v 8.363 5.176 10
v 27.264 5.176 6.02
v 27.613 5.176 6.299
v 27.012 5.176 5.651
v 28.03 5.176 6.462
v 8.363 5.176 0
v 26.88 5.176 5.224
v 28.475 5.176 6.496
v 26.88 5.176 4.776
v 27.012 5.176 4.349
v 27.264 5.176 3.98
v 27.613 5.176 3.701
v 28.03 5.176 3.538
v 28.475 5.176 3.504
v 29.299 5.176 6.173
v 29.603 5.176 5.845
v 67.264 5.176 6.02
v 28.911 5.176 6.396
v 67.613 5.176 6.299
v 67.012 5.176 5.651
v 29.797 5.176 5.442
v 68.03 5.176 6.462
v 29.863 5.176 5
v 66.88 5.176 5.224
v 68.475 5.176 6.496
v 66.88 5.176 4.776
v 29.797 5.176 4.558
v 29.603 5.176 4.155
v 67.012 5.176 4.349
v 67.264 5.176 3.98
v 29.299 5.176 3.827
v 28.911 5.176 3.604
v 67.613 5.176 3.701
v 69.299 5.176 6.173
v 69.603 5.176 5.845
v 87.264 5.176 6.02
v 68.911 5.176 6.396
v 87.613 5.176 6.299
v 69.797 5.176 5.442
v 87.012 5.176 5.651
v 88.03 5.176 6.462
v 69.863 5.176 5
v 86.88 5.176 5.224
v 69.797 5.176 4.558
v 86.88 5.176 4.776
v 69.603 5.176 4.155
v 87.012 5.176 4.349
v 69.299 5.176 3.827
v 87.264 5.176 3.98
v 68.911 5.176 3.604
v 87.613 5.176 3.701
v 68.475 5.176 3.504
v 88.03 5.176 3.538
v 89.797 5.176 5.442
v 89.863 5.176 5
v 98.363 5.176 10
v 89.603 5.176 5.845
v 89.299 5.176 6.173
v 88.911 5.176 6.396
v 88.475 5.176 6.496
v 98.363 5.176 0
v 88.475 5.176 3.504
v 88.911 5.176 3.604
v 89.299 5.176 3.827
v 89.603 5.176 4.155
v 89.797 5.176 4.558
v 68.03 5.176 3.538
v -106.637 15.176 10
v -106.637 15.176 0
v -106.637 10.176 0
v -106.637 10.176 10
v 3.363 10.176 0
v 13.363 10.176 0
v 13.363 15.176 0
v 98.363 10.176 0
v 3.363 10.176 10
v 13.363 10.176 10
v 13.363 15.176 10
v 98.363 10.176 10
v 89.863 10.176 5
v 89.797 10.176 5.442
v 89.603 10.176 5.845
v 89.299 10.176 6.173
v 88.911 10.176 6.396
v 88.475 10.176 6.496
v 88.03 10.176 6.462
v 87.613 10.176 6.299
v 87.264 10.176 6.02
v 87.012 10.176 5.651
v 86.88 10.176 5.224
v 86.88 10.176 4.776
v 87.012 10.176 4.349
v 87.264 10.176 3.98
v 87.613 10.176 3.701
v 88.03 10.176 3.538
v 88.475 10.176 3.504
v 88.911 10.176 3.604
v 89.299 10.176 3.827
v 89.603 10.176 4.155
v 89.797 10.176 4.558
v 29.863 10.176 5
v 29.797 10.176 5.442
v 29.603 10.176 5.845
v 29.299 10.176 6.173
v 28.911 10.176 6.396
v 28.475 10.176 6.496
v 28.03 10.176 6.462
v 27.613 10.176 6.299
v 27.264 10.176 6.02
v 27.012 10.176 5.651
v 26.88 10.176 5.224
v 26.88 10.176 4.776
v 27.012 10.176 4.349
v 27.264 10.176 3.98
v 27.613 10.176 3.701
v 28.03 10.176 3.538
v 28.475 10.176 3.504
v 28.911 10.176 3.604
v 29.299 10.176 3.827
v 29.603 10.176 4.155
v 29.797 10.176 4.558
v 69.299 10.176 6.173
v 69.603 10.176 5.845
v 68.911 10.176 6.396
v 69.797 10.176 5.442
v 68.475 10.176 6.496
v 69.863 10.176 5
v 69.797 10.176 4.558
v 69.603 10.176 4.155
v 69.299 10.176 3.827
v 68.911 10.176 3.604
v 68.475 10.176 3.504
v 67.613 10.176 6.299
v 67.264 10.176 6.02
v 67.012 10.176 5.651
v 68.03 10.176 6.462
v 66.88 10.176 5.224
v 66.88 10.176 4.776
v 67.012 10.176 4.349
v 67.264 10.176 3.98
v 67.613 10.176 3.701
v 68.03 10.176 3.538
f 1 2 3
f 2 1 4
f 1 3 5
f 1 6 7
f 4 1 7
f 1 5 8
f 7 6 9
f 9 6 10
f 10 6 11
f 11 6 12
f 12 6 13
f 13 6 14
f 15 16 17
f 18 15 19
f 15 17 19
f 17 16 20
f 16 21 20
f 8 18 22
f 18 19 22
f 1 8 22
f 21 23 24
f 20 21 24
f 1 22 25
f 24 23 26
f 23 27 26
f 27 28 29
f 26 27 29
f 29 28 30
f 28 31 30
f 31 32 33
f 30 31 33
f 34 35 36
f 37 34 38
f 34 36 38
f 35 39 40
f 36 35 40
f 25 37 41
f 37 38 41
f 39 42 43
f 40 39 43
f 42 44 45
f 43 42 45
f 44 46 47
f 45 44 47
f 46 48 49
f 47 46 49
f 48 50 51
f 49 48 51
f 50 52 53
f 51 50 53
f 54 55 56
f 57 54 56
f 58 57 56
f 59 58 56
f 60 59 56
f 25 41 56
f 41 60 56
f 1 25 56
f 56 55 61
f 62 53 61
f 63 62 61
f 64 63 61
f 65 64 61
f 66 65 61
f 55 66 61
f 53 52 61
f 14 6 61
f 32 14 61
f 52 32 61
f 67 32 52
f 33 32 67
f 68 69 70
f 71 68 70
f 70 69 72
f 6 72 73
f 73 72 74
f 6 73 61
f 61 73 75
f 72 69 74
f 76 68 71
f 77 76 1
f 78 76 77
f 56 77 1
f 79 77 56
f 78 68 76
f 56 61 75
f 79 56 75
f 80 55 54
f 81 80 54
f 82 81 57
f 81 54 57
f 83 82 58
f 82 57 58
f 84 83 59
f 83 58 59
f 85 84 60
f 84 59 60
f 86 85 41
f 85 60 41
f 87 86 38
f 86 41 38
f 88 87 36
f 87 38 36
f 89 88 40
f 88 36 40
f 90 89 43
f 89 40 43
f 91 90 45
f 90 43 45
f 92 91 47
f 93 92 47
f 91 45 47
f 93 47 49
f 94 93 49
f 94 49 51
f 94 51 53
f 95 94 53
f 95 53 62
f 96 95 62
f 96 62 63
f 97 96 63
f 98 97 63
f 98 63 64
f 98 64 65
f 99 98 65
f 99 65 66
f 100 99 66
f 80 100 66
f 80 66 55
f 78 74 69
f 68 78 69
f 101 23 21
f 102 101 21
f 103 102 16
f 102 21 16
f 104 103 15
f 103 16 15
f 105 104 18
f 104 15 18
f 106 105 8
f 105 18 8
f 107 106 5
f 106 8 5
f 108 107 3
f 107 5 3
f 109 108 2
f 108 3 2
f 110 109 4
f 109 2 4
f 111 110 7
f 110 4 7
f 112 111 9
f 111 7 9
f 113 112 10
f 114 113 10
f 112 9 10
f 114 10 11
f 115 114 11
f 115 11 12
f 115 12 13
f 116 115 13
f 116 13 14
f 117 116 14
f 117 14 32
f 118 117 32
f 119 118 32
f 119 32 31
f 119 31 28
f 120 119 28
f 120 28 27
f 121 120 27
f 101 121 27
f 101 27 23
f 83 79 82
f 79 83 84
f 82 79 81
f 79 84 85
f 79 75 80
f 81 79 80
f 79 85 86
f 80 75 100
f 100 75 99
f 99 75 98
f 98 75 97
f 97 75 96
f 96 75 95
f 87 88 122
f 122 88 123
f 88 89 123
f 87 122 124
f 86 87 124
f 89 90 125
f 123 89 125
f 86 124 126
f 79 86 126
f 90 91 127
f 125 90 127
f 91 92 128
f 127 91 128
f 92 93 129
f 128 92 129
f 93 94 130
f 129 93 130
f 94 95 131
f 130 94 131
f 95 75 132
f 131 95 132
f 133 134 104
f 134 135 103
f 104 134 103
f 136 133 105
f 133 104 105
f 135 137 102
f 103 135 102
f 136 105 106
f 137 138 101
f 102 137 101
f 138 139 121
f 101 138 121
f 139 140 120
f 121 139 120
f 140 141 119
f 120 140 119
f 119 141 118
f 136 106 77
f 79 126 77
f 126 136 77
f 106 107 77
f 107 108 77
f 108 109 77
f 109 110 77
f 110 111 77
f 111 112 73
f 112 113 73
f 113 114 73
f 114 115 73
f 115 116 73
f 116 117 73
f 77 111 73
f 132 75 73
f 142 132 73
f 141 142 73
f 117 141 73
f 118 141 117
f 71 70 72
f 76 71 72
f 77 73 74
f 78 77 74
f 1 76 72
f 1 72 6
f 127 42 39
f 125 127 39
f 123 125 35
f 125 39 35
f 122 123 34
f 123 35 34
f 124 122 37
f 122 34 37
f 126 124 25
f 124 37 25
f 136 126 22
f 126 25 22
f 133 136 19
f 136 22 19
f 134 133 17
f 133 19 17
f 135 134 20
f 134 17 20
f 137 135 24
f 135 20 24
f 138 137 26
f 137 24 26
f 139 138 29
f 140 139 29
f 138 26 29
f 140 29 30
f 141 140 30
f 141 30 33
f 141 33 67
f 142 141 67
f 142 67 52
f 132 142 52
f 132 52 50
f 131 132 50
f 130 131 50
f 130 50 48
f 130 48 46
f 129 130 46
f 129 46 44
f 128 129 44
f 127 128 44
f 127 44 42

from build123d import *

# Parameters (mm, degrees)
F1_DEPTH = 10
F2_R     = 1.5
F3_DEPTH = 10.001


with BuildPart() as f1:
    # F0 (on Top) → F1 (new body)
    with BuildSketch(Plane.XY):
        Polygon((13.363348, 15.175648), (-106.636652, 15.175648), (-106.636652, 10.175648), (3.363348, 10.175648), (8.363348, 5.175648), (13.363348, 5.175648), (98.363348, 5.175648), (98.363348, 10.175648), (13.363348, 10.175648), align=None)
    extrude(amount=F1_DEPTH)

    # F2 (on face) → F3 (cut, through all)
    with BuildSketch(Plane.XZ.offset(-5.175648)):
        with Locations((88.363348, 5)):
            Circle(F2_R)
        with Locations((68.363348, 5)):
            Circle(F2_R)
        with Locations((28.363348, 5)):
            Circle(F2_R)
    extrude(amount=-F3_DEPTH, mode=Mode.SUBTRACT)


solid = f1.part
